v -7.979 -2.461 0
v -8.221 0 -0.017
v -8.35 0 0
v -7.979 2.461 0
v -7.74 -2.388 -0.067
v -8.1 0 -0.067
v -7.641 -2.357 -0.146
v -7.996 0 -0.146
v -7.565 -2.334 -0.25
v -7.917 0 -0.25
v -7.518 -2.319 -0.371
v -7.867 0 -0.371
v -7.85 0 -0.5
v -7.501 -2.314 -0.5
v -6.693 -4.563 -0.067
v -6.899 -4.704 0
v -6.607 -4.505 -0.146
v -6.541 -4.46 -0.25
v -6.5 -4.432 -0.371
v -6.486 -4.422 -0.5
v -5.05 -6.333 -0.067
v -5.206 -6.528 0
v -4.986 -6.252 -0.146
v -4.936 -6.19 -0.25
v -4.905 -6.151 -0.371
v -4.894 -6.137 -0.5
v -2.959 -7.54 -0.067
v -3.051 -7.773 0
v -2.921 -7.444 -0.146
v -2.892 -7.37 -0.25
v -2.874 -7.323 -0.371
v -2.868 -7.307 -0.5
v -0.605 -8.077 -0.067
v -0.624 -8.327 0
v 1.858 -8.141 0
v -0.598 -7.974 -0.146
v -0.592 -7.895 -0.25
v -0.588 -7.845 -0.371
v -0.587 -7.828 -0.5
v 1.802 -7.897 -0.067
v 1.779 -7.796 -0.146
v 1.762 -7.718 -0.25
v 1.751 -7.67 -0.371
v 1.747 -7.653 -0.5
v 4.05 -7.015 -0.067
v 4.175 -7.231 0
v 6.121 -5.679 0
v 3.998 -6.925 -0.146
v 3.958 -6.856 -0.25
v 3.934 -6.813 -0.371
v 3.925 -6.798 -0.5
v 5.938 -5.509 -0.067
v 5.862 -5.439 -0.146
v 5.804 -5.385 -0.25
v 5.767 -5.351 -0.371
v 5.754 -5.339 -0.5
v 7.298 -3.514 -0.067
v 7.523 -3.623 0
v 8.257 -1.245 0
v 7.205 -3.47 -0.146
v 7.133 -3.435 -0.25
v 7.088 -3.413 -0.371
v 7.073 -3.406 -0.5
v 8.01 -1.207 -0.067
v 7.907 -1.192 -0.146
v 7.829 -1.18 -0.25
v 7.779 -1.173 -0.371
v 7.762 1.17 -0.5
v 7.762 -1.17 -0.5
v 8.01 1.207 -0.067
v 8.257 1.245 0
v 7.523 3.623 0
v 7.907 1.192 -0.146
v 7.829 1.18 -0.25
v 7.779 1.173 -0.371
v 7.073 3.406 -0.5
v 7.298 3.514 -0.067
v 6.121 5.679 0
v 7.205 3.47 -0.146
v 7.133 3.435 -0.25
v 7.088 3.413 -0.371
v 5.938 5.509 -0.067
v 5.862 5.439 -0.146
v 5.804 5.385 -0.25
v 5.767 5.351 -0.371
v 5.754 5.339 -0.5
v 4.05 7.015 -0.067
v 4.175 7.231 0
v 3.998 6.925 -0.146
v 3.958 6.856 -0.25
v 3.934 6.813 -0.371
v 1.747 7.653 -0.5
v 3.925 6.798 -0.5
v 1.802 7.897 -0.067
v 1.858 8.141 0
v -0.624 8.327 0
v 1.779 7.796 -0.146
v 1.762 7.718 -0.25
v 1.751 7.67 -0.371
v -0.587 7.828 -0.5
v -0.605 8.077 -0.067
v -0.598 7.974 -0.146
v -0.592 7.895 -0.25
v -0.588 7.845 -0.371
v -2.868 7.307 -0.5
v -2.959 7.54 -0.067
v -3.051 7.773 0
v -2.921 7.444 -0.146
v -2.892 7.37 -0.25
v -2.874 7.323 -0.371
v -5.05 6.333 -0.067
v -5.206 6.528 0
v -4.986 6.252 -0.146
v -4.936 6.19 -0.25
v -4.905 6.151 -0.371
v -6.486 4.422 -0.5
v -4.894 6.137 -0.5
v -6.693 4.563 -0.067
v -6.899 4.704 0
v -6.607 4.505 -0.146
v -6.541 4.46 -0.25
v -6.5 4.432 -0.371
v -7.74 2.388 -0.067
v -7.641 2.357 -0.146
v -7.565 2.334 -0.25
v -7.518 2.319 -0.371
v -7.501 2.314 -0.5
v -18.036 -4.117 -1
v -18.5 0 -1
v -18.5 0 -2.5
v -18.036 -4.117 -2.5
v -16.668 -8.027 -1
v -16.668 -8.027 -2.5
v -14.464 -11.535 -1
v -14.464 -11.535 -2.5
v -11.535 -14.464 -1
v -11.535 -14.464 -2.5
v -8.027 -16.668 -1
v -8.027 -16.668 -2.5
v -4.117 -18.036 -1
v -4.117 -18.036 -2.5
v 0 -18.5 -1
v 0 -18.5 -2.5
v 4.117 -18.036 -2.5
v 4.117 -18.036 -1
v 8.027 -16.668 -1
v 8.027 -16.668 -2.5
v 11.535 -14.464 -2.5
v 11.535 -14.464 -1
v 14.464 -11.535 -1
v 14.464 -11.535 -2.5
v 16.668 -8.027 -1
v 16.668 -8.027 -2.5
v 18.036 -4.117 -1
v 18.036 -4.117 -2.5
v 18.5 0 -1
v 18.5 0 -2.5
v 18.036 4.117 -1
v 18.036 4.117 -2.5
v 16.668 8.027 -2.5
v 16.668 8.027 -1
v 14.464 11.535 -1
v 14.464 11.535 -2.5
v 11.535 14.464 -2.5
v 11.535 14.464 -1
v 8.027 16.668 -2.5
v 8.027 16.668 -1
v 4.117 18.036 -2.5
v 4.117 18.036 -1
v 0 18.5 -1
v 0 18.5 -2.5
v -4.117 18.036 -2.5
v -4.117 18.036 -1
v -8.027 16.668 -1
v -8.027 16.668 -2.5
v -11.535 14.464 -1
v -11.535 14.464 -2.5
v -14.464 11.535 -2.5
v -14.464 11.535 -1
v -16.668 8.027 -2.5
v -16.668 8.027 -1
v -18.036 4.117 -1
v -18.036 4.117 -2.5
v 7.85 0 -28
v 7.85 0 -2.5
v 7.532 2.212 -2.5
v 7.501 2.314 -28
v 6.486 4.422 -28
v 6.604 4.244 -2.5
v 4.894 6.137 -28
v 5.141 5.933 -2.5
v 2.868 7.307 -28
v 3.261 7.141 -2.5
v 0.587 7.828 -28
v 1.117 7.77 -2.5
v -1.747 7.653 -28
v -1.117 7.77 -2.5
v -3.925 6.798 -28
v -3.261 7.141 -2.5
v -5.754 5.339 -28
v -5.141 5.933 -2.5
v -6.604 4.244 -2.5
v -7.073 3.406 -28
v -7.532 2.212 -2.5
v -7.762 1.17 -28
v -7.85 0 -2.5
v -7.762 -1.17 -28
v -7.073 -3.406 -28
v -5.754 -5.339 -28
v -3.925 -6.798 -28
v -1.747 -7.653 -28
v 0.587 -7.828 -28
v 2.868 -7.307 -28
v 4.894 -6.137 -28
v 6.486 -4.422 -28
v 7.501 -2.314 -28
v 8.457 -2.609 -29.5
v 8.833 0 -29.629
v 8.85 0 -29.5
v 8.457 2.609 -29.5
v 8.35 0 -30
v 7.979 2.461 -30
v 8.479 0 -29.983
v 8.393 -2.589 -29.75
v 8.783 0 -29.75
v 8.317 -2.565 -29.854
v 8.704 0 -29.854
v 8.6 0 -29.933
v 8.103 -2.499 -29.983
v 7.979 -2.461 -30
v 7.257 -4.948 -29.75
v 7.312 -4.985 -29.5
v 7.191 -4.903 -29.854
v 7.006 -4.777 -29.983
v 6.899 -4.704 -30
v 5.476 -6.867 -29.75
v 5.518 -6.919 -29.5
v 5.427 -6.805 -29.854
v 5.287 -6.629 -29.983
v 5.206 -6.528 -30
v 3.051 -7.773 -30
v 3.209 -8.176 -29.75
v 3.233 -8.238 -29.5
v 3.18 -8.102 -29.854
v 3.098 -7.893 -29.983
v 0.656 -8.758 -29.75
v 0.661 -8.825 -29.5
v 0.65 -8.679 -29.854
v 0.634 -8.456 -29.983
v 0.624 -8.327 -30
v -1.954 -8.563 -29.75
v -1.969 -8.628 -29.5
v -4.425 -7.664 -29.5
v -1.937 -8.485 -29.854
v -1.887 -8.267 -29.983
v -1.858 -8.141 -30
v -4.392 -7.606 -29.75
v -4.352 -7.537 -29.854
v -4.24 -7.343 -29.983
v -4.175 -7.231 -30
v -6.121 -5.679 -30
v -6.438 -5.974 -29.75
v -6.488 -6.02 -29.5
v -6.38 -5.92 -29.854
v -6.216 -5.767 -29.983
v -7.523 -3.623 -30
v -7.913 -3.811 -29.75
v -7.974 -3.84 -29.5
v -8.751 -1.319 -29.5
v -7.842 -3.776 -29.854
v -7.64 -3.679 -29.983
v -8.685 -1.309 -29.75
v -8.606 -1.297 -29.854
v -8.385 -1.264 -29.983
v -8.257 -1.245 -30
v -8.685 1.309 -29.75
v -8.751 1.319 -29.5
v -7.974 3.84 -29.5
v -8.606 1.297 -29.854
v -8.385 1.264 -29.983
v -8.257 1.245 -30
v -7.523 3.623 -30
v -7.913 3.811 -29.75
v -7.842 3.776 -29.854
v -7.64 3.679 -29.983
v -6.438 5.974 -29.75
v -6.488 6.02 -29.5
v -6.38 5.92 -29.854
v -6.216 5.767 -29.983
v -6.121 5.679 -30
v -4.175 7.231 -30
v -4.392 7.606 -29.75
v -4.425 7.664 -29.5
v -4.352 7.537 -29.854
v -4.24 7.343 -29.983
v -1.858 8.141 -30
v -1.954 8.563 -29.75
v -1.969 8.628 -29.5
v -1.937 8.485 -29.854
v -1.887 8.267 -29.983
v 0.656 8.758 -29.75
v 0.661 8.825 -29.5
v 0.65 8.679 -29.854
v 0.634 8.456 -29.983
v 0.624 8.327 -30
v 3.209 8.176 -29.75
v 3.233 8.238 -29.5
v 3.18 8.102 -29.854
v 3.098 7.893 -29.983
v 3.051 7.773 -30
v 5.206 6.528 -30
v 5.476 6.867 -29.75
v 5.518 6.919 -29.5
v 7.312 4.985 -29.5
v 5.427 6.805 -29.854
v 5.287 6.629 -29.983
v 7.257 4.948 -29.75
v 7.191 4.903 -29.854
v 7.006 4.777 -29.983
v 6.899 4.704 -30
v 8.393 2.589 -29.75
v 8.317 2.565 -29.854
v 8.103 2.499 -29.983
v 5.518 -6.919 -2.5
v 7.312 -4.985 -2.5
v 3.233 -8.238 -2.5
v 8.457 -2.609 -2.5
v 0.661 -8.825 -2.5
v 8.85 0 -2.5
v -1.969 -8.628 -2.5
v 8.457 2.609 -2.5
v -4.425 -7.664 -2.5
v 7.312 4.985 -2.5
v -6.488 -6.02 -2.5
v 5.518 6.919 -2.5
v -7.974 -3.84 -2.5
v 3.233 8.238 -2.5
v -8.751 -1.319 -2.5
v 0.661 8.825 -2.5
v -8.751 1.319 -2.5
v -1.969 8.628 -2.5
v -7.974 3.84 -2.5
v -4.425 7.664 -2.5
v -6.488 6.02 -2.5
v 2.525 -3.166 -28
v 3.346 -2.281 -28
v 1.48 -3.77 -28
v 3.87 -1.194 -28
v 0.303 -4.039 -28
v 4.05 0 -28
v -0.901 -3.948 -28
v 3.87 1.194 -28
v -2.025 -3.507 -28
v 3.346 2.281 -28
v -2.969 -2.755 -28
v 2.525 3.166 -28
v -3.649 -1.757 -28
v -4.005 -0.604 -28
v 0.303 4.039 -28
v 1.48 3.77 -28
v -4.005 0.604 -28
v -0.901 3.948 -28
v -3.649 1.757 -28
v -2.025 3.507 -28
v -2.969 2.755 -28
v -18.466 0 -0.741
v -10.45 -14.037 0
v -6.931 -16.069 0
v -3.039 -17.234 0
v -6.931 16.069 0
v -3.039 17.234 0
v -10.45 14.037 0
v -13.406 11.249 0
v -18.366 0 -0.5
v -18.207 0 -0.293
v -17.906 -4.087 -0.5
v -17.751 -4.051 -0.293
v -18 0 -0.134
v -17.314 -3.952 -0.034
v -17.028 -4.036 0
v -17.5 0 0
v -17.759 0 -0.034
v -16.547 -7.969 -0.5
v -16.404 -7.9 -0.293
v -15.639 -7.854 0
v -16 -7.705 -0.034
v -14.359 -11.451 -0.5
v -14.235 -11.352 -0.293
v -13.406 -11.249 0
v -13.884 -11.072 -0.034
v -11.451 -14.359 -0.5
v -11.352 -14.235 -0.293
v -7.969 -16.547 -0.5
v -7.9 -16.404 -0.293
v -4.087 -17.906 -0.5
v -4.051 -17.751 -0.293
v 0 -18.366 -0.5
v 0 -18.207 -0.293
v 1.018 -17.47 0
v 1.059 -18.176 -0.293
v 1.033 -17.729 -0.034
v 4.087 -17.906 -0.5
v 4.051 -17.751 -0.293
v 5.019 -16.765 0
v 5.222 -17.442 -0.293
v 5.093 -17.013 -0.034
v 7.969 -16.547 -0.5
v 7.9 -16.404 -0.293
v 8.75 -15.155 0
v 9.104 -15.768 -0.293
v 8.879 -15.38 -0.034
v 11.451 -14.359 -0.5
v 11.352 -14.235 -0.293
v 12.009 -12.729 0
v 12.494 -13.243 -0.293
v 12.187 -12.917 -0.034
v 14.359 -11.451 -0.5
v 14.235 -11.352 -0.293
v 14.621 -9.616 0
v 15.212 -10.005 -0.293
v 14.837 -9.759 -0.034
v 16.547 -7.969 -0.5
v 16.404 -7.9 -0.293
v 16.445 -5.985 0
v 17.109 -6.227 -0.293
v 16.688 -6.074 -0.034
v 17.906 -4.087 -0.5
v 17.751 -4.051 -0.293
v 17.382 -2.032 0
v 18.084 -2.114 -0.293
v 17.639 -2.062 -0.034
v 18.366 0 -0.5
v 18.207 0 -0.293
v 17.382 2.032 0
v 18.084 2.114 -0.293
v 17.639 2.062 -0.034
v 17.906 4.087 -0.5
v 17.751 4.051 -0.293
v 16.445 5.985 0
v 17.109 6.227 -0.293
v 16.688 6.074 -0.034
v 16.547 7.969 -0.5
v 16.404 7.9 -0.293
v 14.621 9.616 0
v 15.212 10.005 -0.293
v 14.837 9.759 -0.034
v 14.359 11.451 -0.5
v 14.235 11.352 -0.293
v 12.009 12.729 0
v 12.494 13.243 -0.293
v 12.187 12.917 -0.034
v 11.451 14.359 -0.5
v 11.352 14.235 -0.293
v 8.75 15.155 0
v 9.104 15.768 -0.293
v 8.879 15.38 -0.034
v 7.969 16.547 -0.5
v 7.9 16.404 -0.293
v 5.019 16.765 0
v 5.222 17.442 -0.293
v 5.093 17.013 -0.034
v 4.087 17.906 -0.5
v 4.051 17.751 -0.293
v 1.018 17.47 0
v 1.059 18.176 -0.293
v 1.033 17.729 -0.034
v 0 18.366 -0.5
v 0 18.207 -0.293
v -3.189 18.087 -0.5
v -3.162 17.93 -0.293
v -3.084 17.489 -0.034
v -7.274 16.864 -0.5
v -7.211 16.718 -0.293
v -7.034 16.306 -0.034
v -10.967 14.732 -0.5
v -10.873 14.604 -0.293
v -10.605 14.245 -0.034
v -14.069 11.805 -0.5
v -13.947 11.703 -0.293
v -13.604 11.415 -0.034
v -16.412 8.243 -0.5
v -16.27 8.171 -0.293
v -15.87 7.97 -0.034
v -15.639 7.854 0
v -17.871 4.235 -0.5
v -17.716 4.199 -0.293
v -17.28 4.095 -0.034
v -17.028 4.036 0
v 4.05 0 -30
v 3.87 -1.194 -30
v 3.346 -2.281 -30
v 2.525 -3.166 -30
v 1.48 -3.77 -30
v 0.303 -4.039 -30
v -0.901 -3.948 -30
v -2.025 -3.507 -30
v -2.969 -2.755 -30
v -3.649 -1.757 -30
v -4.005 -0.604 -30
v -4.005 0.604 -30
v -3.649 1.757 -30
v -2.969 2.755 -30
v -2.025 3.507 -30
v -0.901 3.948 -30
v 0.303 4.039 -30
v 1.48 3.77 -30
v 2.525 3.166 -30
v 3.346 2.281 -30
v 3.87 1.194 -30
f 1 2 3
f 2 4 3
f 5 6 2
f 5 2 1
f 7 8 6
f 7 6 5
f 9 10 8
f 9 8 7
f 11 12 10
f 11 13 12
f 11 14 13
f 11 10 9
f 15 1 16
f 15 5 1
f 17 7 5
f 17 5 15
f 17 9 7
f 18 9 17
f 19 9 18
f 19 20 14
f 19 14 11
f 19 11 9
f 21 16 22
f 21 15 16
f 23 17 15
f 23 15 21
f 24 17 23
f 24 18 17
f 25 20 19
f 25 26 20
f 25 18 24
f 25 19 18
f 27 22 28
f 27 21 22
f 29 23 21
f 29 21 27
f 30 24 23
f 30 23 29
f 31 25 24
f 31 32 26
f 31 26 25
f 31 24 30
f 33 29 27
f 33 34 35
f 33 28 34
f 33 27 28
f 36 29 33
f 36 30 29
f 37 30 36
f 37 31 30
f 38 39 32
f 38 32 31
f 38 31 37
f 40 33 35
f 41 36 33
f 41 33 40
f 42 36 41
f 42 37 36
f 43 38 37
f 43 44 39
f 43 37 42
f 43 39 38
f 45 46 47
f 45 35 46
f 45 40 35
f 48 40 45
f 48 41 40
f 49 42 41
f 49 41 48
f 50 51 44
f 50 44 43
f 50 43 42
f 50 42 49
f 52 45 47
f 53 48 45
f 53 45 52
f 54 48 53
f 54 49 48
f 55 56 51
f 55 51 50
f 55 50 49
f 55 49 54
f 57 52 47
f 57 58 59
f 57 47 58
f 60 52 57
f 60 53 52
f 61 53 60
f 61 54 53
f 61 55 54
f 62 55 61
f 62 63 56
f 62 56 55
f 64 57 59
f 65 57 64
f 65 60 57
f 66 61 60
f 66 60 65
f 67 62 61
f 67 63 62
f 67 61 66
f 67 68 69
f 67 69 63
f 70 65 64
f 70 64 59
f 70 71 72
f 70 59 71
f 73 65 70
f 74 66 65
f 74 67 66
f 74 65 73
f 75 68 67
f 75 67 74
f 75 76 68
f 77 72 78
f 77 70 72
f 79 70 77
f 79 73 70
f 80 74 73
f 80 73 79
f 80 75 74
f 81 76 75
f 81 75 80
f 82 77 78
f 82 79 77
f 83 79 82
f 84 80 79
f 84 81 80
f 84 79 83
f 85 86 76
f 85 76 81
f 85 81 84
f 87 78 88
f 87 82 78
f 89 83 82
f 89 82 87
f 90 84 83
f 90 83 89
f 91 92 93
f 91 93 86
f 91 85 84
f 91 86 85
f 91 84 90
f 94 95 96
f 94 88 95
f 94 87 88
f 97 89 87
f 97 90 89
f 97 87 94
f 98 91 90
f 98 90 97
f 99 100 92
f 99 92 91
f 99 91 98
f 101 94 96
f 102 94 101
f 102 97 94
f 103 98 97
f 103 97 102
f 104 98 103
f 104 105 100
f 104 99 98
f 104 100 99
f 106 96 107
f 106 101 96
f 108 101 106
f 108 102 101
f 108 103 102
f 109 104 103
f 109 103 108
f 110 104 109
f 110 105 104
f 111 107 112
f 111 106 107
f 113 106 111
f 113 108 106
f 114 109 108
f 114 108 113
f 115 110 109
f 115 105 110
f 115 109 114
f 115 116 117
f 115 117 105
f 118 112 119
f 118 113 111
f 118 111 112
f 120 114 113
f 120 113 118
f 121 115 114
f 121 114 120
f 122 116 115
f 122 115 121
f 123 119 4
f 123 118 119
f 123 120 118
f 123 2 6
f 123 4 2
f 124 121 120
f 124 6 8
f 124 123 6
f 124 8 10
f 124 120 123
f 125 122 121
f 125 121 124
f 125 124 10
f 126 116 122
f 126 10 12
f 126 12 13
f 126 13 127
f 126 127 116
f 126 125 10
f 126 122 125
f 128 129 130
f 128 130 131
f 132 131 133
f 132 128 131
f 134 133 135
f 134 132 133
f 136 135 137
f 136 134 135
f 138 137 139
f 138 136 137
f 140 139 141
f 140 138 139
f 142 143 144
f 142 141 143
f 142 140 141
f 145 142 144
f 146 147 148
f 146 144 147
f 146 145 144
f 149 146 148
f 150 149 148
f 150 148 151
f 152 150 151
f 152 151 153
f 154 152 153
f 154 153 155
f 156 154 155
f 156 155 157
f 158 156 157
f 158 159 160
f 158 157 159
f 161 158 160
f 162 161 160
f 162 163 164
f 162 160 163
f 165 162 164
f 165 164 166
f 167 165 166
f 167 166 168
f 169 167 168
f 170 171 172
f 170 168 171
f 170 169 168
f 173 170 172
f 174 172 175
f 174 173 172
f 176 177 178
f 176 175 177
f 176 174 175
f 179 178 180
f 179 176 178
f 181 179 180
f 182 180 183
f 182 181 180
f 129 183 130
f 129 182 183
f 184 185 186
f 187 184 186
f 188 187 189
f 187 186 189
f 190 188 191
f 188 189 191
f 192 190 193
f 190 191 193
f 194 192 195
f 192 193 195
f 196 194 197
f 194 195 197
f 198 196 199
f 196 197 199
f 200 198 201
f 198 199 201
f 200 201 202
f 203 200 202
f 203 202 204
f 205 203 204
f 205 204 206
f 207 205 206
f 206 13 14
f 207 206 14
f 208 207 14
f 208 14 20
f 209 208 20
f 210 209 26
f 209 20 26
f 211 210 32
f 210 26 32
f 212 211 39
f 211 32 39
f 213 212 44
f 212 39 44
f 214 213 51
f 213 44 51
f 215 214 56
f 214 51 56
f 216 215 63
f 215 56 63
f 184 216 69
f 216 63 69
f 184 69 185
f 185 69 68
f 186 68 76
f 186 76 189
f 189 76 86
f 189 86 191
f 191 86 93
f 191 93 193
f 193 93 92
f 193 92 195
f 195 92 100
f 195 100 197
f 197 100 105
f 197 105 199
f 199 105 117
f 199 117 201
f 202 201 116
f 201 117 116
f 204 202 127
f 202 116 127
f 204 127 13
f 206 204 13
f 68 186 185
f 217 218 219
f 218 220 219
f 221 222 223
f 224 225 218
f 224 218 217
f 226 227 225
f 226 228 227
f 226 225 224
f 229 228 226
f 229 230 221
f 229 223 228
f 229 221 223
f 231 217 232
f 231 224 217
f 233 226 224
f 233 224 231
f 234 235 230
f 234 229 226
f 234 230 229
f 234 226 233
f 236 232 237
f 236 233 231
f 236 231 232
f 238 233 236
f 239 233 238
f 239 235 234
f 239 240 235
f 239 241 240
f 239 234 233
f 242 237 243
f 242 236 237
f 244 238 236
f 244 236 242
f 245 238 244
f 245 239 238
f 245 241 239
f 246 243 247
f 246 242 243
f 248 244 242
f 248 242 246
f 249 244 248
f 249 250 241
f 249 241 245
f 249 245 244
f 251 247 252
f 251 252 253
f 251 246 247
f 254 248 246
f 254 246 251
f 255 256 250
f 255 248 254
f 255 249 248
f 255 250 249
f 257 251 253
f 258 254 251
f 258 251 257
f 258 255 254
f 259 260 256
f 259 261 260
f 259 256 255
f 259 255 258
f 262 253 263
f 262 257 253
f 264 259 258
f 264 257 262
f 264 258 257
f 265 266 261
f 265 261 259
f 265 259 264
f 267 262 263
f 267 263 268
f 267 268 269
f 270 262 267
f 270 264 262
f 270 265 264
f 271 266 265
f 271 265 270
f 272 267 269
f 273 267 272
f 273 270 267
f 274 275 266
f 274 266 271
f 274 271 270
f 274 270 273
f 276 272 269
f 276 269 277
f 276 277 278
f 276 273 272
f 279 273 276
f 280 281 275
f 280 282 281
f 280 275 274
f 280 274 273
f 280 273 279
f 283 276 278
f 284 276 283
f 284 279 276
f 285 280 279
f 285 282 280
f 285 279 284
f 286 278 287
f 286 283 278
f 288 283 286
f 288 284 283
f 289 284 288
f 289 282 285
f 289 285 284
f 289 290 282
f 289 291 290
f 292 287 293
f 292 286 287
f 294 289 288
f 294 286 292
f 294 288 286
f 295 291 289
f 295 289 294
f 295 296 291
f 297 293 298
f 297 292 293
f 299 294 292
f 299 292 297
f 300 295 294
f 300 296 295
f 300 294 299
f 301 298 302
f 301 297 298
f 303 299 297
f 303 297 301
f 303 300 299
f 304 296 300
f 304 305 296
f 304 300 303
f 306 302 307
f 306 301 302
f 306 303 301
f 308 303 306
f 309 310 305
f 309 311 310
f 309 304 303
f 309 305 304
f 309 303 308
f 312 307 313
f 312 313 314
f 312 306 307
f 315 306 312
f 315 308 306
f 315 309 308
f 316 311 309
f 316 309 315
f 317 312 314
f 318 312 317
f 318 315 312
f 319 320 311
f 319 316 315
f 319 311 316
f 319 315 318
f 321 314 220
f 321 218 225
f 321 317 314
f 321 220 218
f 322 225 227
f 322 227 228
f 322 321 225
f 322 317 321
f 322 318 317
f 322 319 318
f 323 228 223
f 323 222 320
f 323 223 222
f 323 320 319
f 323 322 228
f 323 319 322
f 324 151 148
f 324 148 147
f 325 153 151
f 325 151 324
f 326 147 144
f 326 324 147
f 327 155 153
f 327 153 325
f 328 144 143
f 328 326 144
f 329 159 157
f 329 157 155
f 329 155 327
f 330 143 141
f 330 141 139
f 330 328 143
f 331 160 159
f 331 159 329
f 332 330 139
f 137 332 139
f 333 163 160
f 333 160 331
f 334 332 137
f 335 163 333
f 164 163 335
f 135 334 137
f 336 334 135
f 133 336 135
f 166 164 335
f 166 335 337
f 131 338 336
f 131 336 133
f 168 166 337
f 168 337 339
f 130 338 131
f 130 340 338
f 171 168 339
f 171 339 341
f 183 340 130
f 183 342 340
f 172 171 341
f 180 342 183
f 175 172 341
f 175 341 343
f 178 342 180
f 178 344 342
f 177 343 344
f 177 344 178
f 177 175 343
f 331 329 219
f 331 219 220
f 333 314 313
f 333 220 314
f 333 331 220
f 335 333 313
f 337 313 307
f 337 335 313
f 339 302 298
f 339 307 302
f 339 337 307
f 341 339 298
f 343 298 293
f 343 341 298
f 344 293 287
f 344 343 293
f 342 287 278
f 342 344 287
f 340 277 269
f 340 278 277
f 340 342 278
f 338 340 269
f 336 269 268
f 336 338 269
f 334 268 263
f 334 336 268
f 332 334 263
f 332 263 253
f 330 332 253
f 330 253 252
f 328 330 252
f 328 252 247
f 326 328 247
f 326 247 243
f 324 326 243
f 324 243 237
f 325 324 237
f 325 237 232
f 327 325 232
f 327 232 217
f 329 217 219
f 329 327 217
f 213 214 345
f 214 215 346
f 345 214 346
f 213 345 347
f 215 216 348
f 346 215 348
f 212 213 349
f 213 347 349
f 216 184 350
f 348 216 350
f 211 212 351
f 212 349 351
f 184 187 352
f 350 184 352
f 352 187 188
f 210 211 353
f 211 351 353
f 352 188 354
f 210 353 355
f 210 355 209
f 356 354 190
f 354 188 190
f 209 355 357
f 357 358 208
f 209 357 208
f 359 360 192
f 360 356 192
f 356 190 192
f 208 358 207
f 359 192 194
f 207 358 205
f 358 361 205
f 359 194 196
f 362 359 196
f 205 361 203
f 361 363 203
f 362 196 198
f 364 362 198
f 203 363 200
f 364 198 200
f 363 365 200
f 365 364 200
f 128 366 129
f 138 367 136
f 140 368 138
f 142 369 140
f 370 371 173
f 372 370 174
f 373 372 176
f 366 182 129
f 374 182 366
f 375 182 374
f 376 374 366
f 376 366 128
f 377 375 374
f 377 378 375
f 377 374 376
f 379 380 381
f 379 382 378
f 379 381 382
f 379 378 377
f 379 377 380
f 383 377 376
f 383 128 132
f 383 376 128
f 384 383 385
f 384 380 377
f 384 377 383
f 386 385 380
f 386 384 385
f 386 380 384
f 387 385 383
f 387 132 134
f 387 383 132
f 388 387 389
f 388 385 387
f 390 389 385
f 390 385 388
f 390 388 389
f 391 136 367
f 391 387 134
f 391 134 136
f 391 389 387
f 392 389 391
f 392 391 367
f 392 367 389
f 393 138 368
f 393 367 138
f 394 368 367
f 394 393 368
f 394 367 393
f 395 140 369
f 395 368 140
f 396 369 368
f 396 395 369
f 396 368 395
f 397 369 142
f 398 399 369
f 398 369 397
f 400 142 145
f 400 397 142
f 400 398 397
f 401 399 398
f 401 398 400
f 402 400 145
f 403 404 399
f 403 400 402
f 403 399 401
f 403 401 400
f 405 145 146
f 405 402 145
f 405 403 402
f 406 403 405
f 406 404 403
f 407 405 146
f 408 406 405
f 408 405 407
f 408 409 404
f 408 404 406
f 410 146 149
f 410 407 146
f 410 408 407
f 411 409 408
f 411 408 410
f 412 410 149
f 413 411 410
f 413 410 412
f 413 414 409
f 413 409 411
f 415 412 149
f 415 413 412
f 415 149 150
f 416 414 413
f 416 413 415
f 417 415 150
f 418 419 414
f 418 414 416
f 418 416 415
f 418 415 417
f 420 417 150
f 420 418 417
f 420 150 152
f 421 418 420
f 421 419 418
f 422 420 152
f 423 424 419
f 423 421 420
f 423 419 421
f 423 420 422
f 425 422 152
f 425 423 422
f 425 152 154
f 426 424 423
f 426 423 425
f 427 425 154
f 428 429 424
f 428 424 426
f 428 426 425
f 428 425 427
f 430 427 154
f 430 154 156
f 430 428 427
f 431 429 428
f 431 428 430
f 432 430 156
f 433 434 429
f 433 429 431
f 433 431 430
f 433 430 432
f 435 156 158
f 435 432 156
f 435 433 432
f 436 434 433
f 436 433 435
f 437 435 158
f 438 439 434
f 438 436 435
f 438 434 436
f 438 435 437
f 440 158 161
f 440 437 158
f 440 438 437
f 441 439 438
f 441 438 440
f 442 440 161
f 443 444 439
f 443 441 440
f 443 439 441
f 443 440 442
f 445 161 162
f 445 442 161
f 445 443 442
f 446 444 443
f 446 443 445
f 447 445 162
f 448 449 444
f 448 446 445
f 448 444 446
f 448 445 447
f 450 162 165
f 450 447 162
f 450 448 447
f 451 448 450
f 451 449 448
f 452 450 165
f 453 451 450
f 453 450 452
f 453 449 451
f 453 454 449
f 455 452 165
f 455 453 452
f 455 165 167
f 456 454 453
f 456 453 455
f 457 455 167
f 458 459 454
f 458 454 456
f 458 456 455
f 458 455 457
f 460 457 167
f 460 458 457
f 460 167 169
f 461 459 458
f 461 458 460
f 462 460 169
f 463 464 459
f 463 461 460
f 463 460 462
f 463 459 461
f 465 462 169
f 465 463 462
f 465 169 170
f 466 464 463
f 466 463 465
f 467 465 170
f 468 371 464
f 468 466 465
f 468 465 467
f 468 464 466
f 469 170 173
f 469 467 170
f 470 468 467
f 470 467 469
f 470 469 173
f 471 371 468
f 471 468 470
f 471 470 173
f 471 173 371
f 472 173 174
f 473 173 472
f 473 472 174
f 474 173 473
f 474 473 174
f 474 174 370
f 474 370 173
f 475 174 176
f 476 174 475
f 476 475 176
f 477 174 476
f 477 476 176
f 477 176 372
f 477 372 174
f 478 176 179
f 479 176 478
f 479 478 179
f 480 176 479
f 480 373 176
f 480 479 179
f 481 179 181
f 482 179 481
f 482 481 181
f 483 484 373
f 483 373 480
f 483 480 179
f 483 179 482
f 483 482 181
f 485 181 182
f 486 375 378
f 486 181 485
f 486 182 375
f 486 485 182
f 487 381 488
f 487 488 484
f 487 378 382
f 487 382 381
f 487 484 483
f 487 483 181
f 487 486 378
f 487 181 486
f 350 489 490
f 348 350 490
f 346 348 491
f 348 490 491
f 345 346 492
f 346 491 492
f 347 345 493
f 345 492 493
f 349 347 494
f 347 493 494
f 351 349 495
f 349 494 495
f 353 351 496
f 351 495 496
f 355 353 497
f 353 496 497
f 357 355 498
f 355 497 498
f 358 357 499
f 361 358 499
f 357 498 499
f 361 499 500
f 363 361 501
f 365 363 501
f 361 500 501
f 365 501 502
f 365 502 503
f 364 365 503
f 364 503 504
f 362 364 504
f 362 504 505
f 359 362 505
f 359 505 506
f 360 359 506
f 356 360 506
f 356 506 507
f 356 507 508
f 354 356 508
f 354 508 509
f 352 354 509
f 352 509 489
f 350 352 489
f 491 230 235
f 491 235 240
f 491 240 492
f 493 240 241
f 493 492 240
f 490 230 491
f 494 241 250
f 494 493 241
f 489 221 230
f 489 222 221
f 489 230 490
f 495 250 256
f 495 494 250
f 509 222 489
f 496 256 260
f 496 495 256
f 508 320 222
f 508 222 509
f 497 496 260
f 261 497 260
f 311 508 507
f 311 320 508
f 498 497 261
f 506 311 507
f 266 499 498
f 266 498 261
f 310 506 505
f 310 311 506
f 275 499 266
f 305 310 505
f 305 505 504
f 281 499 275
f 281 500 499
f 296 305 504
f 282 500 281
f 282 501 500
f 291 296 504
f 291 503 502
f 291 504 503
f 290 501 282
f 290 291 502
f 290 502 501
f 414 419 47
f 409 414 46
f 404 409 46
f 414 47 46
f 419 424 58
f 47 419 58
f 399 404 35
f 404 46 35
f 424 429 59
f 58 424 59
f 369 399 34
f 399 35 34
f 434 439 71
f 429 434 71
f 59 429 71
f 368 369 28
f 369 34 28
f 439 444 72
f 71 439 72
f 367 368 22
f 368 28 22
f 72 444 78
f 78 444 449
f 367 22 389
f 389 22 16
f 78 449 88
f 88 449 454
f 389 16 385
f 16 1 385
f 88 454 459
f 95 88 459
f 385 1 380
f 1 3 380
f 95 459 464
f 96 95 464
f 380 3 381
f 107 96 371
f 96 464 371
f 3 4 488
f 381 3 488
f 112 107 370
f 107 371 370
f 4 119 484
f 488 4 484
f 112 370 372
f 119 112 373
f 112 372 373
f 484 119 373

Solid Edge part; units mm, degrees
sketch "Sketch1" plane through (0, 0, 0) normal (0, 0, -1) x (-1, 0, 0)
  circle A0 centre (0, 0) radius 18.5
  circle A1 centre (0, 0) radius 7.85
extrude "Protrusion1" add sketch "Sketch1" along normal blind 2.5
sketch "Sketch2" plane through (0, 0, -2.5) normal (0, 0, -1) x (1, 0, 0)
  circle A0 centre (0, 0) radius 7.85
  circle A1 centre (0, 0) radius 8.85
extrude "Kihúzás_2" add sketch "Sketch2" along normal blind 27.5
sketch "Sketch3" plane through (0, 0, -30) normal (0, 0, -1) x (1, 0, 0)
  circle A0 centre (0, 0) radius 7.85
  circle A1 centre (0, 0) radius 4.05
extrude "Kihúzás_3" add sketch "Sketch3" against normal blind 2
fillet "Lekerekítés_2" radius 1 1 edges at (18.5, 0, 0)
fillet "Lekerekítés_3" radius 0.5 1 edges at (-8.85, 0, -30)
fillet "Lekerekítés_4" radius 0.5 1 edges at (7.85, 0, 0)
properties material "Polipropilén, általános rendeltetésű"
